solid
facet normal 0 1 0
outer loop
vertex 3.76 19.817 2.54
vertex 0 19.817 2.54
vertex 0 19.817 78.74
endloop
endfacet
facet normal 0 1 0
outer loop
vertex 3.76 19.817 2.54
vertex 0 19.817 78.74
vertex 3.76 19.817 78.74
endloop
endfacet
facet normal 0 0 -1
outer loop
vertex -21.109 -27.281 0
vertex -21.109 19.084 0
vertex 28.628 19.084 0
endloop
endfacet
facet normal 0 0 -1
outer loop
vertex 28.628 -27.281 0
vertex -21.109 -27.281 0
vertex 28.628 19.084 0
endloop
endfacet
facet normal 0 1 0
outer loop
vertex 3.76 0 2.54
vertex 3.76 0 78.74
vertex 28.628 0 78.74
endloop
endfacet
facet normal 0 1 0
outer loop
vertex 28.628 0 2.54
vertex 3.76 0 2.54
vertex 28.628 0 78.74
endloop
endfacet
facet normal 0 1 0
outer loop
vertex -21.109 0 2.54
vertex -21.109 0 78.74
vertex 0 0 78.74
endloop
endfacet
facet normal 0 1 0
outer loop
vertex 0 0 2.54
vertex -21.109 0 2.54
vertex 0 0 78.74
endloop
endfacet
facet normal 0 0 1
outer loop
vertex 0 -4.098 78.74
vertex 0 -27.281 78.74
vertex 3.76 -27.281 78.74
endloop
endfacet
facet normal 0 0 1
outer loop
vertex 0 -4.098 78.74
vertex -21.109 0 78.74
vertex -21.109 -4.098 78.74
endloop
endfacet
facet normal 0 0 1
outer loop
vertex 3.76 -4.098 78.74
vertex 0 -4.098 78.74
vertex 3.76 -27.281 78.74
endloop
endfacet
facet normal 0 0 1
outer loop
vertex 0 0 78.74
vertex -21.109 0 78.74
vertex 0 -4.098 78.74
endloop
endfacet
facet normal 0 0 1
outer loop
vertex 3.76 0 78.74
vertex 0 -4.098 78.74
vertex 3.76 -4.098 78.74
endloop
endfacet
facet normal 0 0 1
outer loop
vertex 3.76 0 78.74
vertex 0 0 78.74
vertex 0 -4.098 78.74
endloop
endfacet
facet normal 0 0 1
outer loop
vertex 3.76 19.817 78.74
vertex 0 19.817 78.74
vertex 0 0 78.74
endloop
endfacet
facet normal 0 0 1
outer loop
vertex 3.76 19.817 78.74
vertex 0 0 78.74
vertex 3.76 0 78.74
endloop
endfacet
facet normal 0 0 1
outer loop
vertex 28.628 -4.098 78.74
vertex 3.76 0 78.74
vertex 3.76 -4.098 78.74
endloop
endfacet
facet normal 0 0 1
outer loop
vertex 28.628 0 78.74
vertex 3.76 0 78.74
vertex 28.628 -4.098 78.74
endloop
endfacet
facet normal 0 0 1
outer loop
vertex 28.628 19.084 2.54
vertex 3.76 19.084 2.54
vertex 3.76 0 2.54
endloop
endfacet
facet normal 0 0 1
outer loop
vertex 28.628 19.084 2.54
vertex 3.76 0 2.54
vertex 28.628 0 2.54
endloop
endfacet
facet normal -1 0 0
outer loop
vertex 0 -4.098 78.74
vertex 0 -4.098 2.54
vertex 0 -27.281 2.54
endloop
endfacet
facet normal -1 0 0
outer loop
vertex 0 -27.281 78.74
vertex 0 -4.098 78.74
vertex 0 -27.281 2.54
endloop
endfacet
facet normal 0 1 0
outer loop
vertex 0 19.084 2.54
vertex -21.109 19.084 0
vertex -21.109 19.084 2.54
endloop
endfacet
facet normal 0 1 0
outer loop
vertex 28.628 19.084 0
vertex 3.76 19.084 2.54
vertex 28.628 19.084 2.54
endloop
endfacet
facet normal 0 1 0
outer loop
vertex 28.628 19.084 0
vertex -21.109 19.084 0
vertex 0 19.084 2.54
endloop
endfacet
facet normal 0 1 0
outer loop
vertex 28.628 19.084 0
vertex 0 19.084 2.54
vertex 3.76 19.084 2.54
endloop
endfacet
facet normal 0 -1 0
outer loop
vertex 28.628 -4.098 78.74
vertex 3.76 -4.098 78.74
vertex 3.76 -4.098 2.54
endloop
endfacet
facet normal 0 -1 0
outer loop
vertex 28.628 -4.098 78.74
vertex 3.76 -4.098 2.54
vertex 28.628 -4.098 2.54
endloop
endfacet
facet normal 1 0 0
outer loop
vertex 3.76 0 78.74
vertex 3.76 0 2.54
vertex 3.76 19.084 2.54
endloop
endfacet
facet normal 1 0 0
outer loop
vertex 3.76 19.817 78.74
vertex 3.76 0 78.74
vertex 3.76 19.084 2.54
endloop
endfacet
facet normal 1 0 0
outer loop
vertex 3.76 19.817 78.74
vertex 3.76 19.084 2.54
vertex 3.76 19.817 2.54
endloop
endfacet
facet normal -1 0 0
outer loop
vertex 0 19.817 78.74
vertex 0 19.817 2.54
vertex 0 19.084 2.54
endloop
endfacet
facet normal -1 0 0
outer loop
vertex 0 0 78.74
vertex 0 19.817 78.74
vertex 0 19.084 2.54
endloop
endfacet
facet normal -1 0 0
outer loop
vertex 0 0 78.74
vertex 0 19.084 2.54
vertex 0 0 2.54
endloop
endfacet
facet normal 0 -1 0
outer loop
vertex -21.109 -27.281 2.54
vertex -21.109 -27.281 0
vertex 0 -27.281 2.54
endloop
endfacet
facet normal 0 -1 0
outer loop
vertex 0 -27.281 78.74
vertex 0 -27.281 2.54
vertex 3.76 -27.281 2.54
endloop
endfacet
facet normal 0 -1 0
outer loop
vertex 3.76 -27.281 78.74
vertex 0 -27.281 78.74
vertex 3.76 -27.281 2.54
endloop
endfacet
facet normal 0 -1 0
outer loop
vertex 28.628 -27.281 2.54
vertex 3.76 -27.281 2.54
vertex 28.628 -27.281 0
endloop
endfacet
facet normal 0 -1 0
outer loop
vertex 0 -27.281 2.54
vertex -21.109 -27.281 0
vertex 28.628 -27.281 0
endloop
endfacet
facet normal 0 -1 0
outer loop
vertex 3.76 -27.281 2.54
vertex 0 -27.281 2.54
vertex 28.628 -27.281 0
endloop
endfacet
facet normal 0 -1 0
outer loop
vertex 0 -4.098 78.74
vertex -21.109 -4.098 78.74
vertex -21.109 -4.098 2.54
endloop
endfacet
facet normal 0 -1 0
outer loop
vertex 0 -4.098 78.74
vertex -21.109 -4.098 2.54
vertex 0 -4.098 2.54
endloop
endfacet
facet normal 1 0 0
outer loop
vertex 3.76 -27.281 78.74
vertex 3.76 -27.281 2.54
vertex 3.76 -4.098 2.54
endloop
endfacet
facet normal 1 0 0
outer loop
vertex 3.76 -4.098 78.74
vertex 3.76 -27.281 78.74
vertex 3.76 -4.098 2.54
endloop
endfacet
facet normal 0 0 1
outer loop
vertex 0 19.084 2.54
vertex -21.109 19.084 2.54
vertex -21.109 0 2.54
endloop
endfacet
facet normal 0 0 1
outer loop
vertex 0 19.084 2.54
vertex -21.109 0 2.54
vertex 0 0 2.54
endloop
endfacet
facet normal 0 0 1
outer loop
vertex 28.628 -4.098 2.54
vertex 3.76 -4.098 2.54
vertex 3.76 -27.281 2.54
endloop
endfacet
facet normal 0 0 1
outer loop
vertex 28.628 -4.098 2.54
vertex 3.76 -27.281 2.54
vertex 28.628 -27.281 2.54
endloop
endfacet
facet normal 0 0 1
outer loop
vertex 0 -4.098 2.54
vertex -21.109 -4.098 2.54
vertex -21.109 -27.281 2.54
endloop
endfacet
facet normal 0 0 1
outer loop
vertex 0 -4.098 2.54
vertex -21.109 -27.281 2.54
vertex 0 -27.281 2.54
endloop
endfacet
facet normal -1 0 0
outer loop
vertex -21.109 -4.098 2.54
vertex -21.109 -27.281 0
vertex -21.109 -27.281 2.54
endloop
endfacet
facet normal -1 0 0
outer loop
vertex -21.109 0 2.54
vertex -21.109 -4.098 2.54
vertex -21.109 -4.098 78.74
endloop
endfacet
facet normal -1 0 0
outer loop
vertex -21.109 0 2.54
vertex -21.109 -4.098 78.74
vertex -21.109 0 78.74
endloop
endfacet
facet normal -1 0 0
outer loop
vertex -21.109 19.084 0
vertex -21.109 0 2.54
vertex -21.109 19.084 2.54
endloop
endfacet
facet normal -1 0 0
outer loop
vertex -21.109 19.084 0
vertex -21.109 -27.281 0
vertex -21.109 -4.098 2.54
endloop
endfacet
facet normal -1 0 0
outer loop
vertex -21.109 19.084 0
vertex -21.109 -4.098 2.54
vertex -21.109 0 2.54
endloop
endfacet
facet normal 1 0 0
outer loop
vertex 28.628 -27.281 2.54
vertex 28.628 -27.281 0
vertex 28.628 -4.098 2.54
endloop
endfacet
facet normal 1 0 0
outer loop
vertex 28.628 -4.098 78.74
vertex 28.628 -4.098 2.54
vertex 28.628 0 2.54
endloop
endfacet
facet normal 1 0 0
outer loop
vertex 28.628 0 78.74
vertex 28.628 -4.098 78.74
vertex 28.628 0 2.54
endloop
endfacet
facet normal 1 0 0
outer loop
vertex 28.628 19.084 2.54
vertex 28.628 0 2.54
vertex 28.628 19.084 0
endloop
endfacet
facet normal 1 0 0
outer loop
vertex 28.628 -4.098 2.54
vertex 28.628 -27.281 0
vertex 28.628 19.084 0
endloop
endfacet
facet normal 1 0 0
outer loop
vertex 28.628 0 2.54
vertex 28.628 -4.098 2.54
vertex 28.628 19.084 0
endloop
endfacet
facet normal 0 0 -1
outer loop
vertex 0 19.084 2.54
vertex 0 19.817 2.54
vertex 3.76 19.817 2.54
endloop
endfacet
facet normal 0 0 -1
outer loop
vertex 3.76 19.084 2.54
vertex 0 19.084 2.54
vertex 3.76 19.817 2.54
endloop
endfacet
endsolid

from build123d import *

# Parameters (mm, degrees)
F0_W     = 49.7362613678
F0_H     = 46.3653281331
F1_DEPTH = 2.54
F2_W     = 49.7362613678
F2_H     = 4.098245874
F3_DEPTH = 76.2
F4_W     = 3.7595648319
F4_H     = 23.1826640666
F4_H_2   = 23.9149127156
F5_DEPTH = 76.2


# Not quite as in the source:
# - the program builds the solid bodies; features that only make, move or delete a surface that nothing else refers to are left out


with BuildPart() as f1:
    # F0 (on Top) → F1 (new body)
    with BuildSketch(Plane.XY):
        with Locations((3.7595648319, -4.098245874)):
            Rectangle(F0_W, F0_H)
    extrude(amount=F1_DEPTH)

    # F2 (on face) → F3 (join)
    with BuildSketch(Plane.XY.offset(2.54)):
        with Locations((3.7595648319, -2.049122937)):
            Rectangle(F2_W, F2_H)
    extrude(amount=F3_DEPTH)

    # F4 (on face) → F5 (join)
    with BuildSketch(Plane.XY.offset(2.54)):
        with Locations((1.8797824159, -15.6895779073)):
            Rectangle(F4_W, F4_H)
        with Locations((1.8797824159, 7.8592104837)):
            Rectangle(F4_W, F4_H_2)
    extrude(amount=F5_DEPTH)


solid = f1.part
